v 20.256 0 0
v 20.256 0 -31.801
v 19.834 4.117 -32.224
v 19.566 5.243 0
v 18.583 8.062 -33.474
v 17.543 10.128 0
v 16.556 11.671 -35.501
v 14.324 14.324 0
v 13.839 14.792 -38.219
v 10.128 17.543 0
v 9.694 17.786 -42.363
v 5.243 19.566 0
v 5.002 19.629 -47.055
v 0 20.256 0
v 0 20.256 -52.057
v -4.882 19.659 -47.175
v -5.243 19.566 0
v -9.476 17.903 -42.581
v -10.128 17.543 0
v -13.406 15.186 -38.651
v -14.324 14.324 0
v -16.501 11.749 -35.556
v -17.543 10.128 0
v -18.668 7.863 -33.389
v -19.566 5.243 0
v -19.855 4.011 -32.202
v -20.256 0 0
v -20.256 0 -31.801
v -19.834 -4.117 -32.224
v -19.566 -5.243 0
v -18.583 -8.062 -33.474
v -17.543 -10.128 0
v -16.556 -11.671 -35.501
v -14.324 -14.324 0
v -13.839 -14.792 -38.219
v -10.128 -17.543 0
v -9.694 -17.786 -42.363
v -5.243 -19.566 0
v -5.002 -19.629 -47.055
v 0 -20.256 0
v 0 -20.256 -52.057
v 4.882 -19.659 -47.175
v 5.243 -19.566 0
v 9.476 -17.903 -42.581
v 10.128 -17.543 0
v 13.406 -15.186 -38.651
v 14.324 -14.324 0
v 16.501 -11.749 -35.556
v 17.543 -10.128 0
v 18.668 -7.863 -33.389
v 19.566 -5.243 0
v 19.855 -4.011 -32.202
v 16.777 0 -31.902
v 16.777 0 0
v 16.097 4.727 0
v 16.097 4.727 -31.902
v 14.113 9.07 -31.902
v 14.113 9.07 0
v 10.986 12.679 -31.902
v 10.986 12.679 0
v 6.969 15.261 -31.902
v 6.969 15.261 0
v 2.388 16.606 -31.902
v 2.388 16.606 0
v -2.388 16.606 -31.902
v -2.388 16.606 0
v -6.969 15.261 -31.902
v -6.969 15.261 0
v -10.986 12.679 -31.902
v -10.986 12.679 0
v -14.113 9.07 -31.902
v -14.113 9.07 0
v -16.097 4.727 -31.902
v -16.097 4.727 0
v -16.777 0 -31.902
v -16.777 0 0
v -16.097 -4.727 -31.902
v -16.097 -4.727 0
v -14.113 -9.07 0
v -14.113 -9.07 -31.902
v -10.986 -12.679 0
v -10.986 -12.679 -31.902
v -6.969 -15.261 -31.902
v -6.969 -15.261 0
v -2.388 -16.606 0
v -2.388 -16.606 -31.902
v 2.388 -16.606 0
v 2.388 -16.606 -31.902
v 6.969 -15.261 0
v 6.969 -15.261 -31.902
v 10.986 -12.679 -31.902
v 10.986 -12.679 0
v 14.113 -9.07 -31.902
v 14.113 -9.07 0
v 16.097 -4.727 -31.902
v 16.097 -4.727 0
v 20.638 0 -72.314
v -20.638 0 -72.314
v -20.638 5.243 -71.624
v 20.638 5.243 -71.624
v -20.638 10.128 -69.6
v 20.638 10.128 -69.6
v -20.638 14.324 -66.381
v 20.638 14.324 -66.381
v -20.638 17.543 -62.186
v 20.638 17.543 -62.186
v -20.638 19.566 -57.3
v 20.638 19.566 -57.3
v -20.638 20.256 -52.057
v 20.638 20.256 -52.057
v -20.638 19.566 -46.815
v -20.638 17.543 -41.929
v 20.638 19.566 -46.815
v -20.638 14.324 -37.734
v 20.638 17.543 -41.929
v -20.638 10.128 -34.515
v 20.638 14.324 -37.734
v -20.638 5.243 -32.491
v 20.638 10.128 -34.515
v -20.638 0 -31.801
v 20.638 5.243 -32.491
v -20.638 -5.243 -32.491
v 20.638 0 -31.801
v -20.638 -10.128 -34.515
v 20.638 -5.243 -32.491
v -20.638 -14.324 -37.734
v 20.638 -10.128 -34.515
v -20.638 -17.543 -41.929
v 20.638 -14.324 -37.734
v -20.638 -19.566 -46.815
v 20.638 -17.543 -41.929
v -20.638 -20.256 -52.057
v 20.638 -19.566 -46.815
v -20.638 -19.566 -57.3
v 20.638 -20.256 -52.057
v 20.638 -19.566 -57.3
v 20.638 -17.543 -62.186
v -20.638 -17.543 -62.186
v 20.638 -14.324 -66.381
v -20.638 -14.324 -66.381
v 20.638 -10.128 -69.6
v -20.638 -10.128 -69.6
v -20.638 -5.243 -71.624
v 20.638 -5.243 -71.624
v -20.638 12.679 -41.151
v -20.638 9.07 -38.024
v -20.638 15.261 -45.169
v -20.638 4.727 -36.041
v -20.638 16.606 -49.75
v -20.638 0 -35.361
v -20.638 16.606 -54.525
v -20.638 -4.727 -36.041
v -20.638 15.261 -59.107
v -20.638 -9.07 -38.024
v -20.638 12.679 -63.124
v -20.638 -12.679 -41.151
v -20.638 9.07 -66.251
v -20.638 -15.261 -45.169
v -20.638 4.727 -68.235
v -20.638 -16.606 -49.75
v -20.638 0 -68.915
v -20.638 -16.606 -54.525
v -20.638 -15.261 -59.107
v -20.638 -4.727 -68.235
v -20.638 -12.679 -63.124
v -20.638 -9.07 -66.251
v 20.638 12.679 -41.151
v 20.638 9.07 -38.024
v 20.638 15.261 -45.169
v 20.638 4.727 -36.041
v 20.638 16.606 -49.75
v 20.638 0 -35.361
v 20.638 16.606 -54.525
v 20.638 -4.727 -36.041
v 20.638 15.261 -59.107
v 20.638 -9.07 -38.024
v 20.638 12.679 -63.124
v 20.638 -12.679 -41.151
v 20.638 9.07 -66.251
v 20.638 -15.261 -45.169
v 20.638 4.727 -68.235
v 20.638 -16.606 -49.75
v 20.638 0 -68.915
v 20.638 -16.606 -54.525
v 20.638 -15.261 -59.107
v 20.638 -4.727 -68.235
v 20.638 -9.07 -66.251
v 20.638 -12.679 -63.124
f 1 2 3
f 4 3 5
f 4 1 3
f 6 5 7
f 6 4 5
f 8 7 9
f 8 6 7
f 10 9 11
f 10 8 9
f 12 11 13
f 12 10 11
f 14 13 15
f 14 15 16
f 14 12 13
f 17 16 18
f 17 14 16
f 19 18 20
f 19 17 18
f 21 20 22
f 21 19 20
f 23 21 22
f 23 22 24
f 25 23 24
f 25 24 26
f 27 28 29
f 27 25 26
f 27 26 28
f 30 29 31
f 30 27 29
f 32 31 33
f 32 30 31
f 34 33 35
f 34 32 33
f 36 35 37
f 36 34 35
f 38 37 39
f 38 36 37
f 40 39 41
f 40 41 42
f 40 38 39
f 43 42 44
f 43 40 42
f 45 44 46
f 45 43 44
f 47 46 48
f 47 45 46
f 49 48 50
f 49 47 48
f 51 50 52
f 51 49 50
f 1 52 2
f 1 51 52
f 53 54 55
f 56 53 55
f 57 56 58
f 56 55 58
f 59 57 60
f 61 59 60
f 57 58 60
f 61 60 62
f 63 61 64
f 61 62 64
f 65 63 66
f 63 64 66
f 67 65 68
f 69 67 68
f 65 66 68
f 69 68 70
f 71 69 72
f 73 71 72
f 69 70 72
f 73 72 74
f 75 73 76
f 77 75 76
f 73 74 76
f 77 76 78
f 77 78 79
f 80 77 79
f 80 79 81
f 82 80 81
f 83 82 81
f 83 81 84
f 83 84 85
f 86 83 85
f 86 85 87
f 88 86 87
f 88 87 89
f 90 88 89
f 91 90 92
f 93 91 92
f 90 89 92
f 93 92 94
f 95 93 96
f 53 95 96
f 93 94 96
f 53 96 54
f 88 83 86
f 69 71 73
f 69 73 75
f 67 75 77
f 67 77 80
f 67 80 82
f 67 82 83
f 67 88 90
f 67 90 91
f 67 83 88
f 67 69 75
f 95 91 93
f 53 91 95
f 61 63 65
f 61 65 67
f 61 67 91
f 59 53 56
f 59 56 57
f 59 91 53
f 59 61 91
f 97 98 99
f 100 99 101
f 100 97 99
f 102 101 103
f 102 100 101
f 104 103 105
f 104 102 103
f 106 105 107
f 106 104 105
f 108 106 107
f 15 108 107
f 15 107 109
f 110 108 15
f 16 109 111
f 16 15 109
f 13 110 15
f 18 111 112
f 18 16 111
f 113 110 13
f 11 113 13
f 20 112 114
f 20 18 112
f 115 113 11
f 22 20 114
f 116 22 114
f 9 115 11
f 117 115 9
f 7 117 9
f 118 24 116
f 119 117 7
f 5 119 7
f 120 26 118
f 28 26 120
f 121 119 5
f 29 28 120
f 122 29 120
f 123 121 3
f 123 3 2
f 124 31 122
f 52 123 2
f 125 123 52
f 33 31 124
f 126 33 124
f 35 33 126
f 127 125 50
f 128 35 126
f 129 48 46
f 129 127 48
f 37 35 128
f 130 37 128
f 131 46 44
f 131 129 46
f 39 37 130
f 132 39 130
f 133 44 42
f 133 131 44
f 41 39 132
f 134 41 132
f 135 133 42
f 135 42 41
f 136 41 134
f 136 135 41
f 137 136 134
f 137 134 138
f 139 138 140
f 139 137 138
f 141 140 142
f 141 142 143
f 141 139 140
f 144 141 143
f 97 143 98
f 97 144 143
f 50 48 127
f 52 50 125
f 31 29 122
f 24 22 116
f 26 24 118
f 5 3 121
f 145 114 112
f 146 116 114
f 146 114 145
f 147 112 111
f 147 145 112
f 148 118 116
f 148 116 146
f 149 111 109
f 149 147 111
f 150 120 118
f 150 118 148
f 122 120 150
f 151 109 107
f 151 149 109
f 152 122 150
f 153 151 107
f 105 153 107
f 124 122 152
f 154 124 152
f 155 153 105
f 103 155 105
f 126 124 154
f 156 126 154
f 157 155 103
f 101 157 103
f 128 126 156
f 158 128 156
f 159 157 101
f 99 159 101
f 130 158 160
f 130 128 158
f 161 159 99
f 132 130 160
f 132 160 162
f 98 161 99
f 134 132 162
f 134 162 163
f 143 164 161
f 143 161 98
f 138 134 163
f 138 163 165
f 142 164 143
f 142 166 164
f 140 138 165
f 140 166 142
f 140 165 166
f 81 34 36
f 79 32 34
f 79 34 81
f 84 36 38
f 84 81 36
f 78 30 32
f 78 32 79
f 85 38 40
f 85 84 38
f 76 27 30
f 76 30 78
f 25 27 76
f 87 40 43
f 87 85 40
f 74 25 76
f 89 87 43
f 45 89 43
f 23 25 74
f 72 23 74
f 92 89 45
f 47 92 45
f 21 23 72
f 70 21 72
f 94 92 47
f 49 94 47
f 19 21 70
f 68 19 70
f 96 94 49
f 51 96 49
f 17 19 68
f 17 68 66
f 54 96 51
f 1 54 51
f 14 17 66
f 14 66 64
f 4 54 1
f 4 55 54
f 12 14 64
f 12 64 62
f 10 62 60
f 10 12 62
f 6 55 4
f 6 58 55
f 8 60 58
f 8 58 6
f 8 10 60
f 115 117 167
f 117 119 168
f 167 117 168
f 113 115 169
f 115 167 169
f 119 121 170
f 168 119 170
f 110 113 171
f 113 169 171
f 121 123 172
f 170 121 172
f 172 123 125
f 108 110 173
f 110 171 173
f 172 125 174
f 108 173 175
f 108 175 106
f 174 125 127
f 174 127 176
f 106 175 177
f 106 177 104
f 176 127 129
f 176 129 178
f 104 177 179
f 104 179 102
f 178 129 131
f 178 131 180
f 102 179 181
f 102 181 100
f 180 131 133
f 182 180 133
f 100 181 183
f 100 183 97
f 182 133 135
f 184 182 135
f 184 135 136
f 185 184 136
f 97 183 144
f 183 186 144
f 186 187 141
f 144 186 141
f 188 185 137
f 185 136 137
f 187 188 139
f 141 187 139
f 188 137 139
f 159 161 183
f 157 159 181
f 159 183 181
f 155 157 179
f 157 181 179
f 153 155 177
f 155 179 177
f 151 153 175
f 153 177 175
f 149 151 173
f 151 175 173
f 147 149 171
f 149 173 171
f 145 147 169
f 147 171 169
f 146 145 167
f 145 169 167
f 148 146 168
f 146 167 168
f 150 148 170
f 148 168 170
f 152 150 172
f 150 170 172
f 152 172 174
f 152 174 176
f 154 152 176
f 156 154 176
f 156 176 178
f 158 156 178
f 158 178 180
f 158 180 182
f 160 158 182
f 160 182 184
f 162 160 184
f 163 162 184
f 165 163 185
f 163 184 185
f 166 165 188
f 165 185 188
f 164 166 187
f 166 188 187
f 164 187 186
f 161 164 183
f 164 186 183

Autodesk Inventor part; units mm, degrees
ref_plane "YZ Plane" through (0, 0, 0) normal (1, 0, 0) x (0, 1, 0)
ref_plane "XZ Plane" through (0, 0, 0) normal (0, 1, 0) x (-1, 0, 0)
sketch "Sketch1" plane through (0, 0, 0) normal (0, 0, 1) x (1, 0, 0)
  circle A0 centre (0, 0) radius 20.2565
  dimension "d1" = 40.513
sketch "Sketch2" plane through (0, 0, 0) normal (1, 0, 0) x (0, 1, 0)
  line L0 (0, 0) -> (27.2274, 0)
  line L1 (27.2274, 0) -> (27.2274, -51.0956)
  line L2 (27.2274, -51.0956) -> (0, -51.0956)
  line L3 (0, -51.0956) -> (0, 0)
ref_plane "Work Plane2" through (20.6375, 27.2274, 0) normal (-1, 0, 0) x (0, 0, -1)
ref_plane "Work Plane1" through (0, 27.2274, 0) normal (-1, 0, 0) x (0, 0, -1)
extrude "Extrusion1" add sketch "Sketch1" against normal blind 52.0573
sketch "Sketch3" plane through (0, 0, 0) normal (0, 0, 1) x (1, 0, 0)
  circle A0 centre (0, 0) radius 16.7767
  dimension "d5" = 33.5534
sketch "Sketch4" plane through (20.6375, 27.2274, 0) normal (-1, 0, 0) x (0, 0, -1)
  line L0 (52.0573, 6.9709) -> (52.0573, 47.4839) projected
  circle A0 centre (52.0573, 27.2274) radius 20.2565
  point P0 (0, 27.2274)
sketch "Sketch5" plane through (20.6375, 27.2274, 0) normal (-1, 0, 0) x (0, 0, -1)
  circle A0 centre (52.1379, 27.2274) radius 16.7767
  point P0 (0, 27.2274)
  dimension "d10" = 33.5534
extrude "Extrusion2" add sketch "Sketch4" along normal blind 41.275
extrude "Extrusion3" cut sketch "Sketch5" along normal through all
extrude "Extrusion4" cut sketch "Sketch3" against normal blind 31.9024
properties part number "Slip Tee 1 Inch"
